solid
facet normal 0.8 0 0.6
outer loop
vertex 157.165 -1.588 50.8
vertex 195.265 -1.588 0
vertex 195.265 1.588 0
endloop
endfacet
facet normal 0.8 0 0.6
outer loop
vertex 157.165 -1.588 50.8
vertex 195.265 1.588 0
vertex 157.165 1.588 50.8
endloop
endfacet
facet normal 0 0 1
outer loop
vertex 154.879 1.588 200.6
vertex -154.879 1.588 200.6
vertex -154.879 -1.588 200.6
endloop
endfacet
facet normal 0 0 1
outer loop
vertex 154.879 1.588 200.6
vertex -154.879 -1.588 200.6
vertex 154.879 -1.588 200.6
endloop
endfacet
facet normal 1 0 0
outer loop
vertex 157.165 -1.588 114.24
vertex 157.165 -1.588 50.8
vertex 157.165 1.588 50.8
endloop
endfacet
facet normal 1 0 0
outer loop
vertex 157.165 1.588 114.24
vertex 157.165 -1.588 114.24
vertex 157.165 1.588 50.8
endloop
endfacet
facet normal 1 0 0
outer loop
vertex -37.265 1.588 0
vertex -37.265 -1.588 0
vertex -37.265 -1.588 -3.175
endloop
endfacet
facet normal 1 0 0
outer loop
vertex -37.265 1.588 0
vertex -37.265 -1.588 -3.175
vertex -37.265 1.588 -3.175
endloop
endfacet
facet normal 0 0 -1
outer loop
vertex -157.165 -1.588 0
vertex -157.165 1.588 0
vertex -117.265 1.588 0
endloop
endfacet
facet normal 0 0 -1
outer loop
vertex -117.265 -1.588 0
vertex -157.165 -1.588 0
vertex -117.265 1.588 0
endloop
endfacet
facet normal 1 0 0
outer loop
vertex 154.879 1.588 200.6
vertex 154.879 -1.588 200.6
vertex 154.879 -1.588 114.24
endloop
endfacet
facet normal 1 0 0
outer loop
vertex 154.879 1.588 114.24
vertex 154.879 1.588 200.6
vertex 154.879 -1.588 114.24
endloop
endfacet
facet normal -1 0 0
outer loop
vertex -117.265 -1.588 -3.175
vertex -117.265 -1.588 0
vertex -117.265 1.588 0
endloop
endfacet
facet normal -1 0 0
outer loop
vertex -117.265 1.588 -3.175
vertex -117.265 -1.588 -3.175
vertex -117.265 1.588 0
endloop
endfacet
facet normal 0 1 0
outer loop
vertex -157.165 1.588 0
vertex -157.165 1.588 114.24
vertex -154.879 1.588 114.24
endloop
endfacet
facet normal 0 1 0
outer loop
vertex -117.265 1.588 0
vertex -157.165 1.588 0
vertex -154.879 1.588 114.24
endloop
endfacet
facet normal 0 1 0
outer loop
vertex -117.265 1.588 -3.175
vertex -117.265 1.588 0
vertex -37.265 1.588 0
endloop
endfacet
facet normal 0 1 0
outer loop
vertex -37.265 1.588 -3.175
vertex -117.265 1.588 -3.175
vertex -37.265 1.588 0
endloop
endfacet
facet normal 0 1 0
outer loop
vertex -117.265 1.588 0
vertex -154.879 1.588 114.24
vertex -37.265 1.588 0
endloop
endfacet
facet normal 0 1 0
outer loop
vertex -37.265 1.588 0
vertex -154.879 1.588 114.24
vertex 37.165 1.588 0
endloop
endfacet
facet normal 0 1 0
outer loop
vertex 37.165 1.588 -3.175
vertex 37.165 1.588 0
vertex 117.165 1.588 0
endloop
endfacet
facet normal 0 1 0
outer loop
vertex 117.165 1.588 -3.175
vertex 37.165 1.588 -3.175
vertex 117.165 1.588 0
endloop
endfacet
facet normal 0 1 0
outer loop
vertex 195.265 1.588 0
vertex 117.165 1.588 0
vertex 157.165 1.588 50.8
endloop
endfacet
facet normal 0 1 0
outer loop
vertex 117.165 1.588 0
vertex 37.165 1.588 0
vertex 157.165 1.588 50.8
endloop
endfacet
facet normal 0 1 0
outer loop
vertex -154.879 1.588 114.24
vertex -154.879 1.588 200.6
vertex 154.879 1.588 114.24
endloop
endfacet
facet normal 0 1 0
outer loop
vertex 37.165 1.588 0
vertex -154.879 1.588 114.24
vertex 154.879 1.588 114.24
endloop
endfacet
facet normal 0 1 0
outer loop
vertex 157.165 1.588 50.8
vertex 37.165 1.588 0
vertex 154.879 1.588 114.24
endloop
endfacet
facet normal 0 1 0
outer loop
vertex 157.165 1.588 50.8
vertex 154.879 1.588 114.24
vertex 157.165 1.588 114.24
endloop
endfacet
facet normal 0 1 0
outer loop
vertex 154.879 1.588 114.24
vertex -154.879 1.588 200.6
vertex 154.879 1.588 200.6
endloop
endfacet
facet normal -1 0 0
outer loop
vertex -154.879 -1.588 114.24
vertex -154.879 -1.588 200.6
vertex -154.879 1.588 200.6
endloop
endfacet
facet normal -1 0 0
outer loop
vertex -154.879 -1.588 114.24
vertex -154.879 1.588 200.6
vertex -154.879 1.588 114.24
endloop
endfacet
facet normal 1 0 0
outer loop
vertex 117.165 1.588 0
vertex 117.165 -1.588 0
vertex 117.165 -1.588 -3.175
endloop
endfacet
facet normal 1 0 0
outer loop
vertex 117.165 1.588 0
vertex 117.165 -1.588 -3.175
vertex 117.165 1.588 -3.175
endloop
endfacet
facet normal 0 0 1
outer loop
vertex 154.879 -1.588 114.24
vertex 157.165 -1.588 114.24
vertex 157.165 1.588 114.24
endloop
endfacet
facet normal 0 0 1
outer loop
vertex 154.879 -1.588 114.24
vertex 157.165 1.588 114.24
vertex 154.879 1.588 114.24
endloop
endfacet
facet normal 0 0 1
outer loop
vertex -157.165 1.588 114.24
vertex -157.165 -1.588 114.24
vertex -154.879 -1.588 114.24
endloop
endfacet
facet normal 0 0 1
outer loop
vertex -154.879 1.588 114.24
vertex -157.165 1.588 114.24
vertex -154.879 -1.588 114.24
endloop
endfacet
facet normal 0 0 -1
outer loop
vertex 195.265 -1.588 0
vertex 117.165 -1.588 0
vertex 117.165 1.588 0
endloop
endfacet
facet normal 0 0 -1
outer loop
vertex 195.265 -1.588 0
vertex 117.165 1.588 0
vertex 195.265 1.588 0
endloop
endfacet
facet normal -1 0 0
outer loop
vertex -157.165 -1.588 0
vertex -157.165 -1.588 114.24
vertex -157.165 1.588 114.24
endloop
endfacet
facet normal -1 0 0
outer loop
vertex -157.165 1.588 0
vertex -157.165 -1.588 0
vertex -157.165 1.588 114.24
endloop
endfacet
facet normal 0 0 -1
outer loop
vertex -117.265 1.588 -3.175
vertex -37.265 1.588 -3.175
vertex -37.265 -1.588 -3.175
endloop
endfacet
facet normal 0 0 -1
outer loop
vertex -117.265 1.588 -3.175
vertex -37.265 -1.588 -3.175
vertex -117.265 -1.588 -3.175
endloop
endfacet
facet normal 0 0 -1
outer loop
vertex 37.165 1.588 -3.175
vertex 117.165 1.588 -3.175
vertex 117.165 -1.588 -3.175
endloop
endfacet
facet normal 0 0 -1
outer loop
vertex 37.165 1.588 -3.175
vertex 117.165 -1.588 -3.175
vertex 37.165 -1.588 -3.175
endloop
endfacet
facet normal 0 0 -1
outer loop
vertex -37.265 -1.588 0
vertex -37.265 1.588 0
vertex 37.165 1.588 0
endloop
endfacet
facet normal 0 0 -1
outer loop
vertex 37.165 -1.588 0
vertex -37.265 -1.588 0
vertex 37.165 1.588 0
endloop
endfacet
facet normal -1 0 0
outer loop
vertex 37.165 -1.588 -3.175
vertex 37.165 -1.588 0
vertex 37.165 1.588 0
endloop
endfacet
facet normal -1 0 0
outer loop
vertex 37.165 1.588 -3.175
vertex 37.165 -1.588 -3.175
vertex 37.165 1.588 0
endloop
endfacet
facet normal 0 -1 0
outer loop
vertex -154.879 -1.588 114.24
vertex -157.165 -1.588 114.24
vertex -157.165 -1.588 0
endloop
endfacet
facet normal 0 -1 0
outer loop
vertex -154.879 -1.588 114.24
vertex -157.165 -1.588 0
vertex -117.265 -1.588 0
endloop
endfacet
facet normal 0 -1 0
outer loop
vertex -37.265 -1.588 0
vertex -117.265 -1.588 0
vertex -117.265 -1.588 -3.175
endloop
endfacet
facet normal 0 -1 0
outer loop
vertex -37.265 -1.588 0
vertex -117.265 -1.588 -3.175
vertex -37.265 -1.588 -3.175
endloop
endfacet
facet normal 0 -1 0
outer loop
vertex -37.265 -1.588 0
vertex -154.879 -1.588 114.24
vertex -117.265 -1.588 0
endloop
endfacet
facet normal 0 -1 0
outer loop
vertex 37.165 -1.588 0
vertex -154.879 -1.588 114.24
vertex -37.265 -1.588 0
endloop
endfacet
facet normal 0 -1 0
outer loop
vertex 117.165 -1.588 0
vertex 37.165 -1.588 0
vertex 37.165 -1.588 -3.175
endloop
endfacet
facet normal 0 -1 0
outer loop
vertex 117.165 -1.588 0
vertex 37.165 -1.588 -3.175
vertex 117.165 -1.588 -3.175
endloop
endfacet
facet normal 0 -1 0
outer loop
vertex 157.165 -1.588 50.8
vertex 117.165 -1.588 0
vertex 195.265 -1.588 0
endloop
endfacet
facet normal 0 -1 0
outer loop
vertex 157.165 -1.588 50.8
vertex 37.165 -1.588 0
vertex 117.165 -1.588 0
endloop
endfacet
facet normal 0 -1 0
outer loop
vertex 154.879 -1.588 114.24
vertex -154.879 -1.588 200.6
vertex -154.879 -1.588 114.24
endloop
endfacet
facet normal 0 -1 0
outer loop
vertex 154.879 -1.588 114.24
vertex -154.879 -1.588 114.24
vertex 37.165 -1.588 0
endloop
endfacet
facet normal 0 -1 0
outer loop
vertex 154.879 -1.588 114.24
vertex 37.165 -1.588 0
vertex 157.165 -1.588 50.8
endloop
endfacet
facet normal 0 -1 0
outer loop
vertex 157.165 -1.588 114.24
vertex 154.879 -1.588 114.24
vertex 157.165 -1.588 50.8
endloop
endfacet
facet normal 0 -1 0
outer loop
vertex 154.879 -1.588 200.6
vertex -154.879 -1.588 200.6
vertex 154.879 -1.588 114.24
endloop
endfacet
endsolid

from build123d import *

# Parameters (mm, degrees)
SKETCH1_W           = 314.32961264
SKETCH1_H           = 3.175
BOSS_EXTRUDE1_DEPTH = 200.60000012
CUT_EXTRUDE2_START  = -3.175
SKETCH5_W           = 2.286
SKETCH5_H           = 86.36
CUT_EXTRUDE2_DEPTH  = 259.030286425
SKETCH3_W           = 80
SKETCH3_H           = 3.175
BOSS_EXTRUDE2_DEPTH = 3.175
LPATTERN2_COUNT     = 2
LPATTERN2_PITCH     = 154.43
BOSS_EXTRUDE3_DEPTH = 3.175


with BuildPart() as part:
    # Sketch1 → Boss-Extrude1 (new body)
    with BuildSketch(Plane.XY):
        Rectangle(SKETCH1_W, SKETCH1_H)
    extrude(amount=BOSS_EXTRUDE1_DEPTH)

    # Sketch5 → Cut-Extrude2 (cut)
    with BuildSketch(Plane(origin=(0, 1.5875, 0), x_dir=(1, 0, 0), z_dir=(0, 1, 0)).offset(CUT_EXTRUDE2_START)):
        with Locations((-156.02180632, -157.42000012)):
            Rectangle(SKETCH5_W, SKETCH5_H)
    cut_extrude2 = extrude(amount=CUT_EXTRUDE2_DEPTH, mode=Mode.SUBTRACT)

    # Mirror1: Cut-Extrude2 across plane
    add(cut_extrude2.mirror(Plane(origin=(0, 0, 0), x_dir=(0, 0, 1), z_dir=(1, 0, 0))), mode=Mode.SUBTRACT)

    # Sketch3 → Boss-Extrude2 (add)
    with BuildSketch(Plane(origin=(0, 0, 0), x_dir=(-1, 0, 0), z_dir=(0, 0, -1))):
        with Locations((-77.16480632, 0)):
            Rectangle(SKETCH3_W, SKETCH3_H)
    boss_extrude2 = extrude(amount=BOSS_EXTRUDE2_DEPTH)

    # LPattern2: Boss-Extrude2 ×2
    with Locations(*[(-i * LPATTERN2_PITCH, 0, 0) for i in range(1, LPATTERN2_COUNT)]):
        add(boss_extrude2)

    # Sketch10 → Boss-Extrude3 (add)
    with BuildSketch(Plane.XZ.offset(1.5875)):
        Polygon((157.16480632, 0), (195.26480632, 0), (157.16480632, 50.8), align=None)
    extrude(amount=-BOSS_EXTRUDE3_DEPTH)


solid = part.part
